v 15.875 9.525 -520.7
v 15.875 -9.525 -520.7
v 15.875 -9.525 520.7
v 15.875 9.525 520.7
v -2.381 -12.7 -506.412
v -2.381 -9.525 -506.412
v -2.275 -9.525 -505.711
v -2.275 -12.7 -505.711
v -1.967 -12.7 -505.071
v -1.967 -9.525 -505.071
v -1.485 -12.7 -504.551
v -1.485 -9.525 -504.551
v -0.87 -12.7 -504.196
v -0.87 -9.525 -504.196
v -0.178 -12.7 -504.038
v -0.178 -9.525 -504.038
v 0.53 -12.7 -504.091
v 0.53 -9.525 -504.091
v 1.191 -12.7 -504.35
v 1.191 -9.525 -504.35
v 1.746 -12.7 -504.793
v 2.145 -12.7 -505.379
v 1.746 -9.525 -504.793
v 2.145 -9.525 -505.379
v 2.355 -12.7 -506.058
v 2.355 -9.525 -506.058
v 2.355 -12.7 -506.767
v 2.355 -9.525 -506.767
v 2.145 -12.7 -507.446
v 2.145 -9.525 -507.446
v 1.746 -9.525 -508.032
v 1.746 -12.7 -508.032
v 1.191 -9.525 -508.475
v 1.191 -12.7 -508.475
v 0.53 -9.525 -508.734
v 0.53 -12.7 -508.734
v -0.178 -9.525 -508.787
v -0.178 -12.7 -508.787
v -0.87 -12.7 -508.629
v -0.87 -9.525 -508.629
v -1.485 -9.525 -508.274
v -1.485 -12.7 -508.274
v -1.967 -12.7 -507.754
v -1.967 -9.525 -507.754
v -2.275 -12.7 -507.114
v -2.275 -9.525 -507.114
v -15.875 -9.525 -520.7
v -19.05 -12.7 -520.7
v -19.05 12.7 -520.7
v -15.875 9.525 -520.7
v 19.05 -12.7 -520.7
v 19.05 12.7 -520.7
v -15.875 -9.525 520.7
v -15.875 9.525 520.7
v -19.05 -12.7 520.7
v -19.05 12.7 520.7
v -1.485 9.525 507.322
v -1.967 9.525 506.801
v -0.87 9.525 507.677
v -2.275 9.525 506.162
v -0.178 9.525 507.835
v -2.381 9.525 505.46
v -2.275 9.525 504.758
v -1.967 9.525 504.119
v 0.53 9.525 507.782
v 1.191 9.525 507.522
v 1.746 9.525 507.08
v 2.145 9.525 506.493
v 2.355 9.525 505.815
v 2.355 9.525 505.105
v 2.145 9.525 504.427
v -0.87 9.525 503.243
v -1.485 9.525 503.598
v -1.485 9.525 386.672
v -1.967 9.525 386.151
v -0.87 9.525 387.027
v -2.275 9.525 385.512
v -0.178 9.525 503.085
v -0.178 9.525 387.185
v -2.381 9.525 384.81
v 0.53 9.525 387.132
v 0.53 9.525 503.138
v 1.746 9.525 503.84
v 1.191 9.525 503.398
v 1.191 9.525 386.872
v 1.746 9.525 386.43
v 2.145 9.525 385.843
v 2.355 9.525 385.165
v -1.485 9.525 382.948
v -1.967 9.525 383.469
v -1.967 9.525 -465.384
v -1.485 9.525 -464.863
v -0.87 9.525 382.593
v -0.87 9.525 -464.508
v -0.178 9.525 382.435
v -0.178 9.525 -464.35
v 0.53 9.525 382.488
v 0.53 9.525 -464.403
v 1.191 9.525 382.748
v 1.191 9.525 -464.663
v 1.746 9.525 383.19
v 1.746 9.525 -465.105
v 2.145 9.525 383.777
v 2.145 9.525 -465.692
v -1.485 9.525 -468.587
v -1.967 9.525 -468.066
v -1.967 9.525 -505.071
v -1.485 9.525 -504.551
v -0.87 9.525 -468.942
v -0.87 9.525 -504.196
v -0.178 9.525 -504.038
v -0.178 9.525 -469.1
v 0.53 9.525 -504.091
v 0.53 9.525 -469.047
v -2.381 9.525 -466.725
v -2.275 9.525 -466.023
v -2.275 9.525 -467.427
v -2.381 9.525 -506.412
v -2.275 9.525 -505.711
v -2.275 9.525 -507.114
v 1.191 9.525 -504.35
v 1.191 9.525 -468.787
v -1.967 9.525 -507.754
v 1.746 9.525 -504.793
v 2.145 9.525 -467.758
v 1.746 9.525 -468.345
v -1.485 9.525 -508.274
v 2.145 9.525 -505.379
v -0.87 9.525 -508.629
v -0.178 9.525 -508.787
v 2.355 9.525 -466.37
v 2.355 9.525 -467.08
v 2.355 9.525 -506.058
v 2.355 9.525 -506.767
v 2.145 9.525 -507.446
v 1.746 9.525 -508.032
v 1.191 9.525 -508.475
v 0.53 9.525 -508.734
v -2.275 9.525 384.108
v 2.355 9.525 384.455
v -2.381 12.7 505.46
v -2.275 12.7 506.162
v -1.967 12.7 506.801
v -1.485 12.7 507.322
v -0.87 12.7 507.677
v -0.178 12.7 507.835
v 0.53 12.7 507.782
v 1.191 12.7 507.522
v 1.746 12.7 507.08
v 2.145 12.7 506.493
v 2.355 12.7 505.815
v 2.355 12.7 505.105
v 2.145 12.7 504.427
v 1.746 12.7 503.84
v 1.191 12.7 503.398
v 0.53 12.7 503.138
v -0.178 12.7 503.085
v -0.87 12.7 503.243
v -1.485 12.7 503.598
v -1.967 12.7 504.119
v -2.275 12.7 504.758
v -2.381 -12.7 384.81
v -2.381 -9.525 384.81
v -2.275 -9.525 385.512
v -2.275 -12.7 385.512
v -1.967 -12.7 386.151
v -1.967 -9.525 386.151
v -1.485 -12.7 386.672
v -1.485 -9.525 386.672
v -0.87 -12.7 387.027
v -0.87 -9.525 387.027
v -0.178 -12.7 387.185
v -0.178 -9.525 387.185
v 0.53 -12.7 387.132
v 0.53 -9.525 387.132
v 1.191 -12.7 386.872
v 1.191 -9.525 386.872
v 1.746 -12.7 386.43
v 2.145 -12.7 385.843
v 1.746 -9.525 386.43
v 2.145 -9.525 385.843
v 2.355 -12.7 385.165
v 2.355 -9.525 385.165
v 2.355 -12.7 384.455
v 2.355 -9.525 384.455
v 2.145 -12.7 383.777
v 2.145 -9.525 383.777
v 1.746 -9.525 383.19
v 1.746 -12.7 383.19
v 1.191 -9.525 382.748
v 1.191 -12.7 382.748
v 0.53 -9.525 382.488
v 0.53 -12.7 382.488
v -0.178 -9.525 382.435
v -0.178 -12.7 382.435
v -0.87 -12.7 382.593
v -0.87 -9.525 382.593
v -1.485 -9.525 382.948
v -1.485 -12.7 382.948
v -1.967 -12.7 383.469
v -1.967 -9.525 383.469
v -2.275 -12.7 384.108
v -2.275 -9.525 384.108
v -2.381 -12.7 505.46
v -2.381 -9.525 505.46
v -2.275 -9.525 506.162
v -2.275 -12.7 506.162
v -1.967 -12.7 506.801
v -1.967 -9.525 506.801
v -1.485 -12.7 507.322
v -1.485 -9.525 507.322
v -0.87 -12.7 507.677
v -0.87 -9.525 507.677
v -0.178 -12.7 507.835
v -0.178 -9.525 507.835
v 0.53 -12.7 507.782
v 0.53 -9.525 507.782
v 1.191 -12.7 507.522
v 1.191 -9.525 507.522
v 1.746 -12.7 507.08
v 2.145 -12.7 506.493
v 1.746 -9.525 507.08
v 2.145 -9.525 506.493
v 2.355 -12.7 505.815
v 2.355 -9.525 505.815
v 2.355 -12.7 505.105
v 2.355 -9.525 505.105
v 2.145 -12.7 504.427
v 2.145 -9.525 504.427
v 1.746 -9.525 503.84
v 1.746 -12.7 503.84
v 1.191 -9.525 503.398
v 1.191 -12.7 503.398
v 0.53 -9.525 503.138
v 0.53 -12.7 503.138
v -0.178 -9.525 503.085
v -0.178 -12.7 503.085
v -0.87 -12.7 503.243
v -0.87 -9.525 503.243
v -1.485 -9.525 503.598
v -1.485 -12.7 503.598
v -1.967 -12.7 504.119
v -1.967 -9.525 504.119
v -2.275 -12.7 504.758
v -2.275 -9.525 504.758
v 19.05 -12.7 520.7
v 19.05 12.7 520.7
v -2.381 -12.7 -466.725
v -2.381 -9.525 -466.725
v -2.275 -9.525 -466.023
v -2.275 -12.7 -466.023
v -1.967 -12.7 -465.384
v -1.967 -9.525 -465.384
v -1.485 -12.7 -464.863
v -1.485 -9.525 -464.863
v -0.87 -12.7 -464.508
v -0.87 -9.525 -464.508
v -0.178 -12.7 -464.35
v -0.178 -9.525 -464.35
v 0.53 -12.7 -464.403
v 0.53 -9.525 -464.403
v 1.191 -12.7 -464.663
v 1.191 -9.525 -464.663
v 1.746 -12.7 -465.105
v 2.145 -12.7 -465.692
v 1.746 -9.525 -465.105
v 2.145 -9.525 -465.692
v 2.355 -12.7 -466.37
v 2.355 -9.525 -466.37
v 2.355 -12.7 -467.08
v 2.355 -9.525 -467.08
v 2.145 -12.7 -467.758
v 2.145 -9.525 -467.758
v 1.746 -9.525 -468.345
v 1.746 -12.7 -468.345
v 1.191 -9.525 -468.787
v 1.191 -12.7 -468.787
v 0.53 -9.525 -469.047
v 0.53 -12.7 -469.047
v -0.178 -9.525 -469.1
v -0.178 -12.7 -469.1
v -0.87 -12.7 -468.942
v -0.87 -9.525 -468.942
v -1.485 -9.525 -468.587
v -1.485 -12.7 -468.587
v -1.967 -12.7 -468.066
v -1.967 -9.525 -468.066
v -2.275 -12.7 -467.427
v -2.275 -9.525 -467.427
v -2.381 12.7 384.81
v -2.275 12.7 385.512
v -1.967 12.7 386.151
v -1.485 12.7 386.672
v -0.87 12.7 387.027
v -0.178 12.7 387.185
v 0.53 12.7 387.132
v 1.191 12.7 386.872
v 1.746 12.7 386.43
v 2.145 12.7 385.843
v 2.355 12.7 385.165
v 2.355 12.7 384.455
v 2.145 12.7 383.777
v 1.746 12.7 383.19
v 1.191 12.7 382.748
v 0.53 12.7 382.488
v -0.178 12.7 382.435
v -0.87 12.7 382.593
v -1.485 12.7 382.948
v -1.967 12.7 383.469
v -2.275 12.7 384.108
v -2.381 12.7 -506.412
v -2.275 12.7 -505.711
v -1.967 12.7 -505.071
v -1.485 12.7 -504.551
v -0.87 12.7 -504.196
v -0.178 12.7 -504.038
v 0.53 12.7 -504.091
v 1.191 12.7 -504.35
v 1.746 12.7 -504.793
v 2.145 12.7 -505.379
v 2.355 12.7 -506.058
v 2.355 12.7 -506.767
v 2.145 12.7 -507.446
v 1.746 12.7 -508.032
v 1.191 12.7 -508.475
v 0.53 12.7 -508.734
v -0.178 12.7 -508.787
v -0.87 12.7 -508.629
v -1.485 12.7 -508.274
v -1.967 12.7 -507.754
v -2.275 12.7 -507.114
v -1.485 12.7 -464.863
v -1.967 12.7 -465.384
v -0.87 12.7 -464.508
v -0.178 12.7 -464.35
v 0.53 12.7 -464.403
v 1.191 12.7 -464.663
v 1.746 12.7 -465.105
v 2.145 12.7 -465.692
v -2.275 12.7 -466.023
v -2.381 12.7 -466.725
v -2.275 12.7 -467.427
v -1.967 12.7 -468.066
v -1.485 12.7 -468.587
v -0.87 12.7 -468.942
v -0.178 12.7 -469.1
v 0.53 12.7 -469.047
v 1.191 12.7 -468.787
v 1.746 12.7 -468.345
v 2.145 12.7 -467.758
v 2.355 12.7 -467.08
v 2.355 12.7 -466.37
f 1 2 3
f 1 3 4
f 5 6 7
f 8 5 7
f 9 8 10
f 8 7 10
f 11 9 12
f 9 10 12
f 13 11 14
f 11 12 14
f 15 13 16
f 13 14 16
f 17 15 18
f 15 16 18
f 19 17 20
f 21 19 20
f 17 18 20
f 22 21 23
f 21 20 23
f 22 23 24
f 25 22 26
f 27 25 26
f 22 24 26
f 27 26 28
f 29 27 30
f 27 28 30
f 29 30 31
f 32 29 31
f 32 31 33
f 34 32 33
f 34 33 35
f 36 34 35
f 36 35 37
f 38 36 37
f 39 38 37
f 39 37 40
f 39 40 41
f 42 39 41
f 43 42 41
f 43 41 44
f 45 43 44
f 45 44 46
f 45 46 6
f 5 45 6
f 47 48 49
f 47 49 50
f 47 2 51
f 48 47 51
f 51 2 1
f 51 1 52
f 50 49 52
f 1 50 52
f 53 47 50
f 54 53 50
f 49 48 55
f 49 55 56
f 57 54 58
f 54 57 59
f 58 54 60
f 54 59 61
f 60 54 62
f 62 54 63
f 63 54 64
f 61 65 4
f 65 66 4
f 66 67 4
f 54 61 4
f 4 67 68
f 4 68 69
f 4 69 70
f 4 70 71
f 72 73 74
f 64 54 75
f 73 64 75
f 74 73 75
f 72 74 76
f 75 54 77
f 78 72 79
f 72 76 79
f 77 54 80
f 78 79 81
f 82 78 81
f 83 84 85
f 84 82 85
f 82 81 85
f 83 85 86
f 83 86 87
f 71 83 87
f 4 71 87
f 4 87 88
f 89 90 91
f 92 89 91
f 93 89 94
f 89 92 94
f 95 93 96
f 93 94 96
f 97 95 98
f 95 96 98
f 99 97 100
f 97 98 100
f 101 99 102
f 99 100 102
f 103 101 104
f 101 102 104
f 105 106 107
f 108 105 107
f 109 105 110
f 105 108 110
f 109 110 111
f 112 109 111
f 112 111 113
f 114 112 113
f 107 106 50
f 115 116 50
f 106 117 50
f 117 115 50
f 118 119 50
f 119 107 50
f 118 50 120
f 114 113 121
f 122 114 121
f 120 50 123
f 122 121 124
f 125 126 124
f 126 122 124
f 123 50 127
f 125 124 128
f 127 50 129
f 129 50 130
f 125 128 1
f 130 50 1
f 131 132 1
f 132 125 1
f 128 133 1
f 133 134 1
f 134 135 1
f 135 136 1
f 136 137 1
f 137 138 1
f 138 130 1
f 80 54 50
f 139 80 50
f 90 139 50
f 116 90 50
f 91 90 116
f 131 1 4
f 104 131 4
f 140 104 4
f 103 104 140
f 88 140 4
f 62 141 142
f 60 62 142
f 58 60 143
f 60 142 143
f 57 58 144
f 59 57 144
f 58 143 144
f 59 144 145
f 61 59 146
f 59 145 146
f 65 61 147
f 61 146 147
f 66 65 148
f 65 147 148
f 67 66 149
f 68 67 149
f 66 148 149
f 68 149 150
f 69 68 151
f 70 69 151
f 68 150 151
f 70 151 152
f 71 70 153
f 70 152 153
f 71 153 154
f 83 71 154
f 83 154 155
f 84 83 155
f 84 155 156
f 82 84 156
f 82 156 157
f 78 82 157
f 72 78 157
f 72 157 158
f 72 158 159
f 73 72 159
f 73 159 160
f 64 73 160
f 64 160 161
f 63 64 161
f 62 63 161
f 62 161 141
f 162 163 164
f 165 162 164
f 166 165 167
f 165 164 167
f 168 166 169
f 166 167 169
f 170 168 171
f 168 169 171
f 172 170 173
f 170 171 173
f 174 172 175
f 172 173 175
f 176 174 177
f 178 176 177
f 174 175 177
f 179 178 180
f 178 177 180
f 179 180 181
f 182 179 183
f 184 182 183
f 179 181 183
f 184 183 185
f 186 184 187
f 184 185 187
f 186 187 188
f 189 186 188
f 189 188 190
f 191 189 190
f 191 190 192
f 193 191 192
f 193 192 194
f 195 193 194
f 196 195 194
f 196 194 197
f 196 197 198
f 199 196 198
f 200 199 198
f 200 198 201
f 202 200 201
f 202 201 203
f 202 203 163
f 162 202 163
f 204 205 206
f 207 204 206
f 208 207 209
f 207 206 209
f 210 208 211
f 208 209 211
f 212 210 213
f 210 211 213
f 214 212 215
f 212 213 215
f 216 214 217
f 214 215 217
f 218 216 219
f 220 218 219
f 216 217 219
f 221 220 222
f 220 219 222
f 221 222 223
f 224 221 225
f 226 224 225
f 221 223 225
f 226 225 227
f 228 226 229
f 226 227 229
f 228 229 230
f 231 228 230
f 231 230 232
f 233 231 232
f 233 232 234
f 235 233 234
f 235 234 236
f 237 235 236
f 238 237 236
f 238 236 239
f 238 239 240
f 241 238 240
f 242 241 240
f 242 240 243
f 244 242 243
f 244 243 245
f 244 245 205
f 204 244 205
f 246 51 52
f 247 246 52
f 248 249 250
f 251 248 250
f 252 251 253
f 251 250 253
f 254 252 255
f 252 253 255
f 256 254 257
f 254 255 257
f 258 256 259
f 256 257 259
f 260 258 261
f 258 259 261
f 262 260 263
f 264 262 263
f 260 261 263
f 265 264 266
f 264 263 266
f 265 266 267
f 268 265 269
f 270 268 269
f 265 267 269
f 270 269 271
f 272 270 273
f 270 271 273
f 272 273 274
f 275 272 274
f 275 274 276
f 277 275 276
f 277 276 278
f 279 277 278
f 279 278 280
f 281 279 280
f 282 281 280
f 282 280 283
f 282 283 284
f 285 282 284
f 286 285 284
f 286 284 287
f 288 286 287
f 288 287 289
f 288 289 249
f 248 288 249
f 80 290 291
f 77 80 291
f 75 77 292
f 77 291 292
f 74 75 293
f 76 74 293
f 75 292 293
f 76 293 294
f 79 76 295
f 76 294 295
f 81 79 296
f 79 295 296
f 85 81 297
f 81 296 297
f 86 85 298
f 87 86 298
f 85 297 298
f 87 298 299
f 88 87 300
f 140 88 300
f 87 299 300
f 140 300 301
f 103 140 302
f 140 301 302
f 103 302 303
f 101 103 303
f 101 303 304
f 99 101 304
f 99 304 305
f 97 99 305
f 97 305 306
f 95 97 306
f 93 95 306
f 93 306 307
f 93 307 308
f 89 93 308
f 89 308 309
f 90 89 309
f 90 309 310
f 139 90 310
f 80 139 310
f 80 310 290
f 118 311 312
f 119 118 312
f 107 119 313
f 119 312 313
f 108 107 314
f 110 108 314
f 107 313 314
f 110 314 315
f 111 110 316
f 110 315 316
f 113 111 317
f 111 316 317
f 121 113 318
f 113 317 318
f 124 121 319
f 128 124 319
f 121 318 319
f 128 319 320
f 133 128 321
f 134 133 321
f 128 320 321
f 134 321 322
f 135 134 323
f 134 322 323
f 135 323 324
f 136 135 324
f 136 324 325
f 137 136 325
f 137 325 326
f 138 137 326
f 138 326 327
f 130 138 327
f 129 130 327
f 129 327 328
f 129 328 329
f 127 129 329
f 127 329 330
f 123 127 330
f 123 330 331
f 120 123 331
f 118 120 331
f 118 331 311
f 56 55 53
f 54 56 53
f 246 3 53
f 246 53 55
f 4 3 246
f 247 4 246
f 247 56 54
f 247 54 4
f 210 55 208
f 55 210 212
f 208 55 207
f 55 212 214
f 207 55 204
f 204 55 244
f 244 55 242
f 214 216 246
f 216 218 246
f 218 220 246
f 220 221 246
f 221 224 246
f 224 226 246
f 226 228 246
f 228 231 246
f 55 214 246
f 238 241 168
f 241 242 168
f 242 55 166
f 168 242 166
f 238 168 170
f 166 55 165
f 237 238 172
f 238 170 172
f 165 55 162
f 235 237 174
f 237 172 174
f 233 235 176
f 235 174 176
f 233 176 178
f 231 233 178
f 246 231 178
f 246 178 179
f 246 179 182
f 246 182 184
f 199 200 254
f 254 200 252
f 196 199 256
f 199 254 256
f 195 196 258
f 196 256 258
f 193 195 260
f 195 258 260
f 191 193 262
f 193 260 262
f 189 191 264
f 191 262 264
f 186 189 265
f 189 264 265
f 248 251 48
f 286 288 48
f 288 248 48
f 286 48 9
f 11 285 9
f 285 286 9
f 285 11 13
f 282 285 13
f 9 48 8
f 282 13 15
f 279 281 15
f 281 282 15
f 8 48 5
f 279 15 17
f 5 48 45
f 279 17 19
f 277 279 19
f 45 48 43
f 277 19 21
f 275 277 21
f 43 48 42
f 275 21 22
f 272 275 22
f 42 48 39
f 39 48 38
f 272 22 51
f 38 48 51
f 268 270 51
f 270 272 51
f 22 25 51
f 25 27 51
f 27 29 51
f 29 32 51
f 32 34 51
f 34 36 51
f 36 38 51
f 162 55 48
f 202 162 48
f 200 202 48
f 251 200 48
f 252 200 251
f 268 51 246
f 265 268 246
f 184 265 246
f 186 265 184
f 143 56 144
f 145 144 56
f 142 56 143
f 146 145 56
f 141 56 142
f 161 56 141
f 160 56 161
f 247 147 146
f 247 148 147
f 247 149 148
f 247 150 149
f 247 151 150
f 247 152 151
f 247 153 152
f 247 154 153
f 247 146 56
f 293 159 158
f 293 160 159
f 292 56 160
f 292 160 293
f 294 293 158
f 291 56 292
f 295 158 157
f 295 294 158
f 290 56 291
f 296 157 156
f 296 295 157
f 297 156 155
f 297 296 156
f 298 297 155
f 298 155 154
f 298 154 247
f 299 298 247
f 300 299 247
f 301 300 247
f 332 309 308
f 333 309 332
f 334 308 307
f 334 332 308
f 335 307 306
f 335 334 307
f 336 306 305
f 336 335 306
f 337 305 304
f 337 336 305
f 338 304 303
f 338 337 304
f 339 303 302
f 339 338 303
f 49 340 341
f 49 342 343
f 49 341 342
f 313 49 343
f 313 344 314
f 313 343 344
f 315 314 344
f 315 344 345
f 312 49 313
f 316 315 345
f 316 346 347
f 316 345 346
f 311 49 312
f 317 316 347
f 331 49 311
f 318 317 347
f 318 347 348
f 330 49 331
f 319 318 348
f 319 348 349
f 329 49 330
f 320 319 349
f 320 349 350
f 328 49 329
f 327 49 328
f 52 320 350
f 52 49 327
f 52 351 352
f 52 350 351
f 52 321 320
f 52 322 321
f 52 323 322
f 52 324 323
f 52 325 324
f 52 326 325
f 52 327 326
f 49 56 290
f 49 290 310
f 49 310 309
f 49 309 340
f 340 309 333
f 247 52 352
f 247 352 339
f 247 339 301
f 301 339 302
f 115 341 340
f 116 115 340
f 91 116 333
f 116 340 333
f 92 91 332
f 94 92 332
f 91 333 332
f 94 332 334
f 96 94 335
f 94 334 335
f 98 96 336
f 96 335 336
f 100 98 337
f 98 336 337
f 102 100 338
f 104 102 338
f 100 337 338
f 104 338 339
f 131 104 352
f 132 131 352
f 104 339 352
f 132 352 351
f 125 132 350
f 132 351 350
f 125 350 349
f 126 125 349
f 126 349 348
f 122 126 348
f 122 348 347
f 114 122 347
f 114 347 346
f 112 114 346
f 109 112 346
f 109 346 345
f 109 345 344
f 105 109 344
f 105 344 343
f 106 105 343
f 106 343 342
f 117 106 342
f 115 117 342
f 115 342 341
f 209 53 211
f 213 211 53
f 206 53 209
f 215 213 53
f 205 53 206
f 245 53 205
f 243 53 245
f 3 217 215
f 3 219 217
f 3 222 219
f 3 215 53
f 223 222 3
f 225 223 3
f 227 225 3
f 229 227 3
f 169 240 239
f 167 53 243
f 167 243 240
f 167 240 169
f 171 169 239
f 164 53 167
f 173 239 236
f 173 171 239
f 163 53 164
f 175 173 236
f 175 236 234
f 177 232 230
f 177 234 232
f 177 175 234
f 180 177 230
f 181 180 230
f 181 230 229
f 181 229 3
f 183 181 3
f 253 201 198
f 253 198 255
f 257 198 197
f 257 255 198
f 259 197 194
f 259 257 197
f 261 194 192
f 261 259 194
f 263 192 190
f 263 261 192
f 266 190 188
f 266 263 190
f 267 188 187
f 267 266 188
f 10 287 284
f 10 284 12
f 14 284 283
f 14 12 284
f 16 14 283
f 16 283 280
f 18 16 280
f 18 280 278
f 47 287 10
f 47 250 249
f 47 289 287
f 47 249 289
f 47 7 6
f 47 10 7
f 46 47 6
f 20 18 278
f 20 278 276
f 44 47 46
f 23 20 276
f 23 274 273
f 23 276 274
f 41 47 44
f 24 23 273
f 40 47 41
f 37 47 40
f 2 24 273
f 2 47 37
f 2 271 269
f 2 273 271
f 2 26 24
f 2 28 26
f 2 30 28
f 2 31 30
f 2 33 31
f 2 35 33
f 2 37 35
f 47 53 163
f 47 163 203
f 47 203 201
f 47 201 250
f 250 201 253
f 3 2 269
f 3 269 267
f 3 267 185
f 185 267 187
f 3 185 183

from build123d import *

# Parameters (mm, degrees)
BOSS_EXTRUDE1_DEPTH      = 520.7
BOSS_EXTRUDE1_DEPTH_BACK = 520.7
SKETCH1_W                = 38.1
SKETCH1_H                = 25.4
SKETCH1_W_2              = 31.75
SKETCH1_H_2              = 19.05
SKETCH2_R                = 2.38125
CUT_EXTRUDE1_DEPTH       = 520.7
SKETCH3_R                = 2.38125
CUT_EXTRUDE2_DEPTH       = 100


with BuildPart() as part:
    # Sketch1 → Boss-Extrude1 (new, two sides: drawn at the far end of the back side and taken through both)
    with BuildSketch(Plane.XY.offset(-BOSS_EXTRUDE1_DEPTH_BACK)):
        Rectangle(SKETCH1_W, SKETCH1_H)
        Rectangle(SKETCH1_W_2, SKETCH1_H_2, mode=Mode.SUBTRACT)
    extrude(amount=BOSS_EXTRUDE1_DEPTH + BOSS_EXTRUDE1_DEPTH_BACK)

    # Sketch2 → Cut-Extrude1 (cut)
    with BuildSketch(Plane(origin=(0, 12.7, 0), x_dir=(1, 0, 0), z_dir=(0, 1, 0))):
        with Locations(Location((0, -384.81, 0), (0, 0, 180))):
            Circle(SKETCH2_R)
        with Locations(Location((0, -505.46, 0), (0, 0, 180))):
            Circle(SKETCH2_R)
    extrude(amount=-CUT_EXTRUDE1_DEPTH, mode=Mode.SUBTRACT)

    # Sketch3 → Cut-Extrude2 (cut)
    with BuildSketch(Plane(origin=(0, 12.7, 0), x_dir=(1, 0, 0), z_dir=(0, 1, 0))):
        with Locations(Location((0, 506.4125, 0), (0, 0, 180))):
            Circle(SKETCH3_R)
        with Locations(Location((0, 466.725, 0), (0, 0, 180))):
            Circle(SKETCH3_R)
    extrude(amount=-CUT_EXTRUDE2_DEPTH, mode=Mode.SUBTRACT)


solid = part.part
